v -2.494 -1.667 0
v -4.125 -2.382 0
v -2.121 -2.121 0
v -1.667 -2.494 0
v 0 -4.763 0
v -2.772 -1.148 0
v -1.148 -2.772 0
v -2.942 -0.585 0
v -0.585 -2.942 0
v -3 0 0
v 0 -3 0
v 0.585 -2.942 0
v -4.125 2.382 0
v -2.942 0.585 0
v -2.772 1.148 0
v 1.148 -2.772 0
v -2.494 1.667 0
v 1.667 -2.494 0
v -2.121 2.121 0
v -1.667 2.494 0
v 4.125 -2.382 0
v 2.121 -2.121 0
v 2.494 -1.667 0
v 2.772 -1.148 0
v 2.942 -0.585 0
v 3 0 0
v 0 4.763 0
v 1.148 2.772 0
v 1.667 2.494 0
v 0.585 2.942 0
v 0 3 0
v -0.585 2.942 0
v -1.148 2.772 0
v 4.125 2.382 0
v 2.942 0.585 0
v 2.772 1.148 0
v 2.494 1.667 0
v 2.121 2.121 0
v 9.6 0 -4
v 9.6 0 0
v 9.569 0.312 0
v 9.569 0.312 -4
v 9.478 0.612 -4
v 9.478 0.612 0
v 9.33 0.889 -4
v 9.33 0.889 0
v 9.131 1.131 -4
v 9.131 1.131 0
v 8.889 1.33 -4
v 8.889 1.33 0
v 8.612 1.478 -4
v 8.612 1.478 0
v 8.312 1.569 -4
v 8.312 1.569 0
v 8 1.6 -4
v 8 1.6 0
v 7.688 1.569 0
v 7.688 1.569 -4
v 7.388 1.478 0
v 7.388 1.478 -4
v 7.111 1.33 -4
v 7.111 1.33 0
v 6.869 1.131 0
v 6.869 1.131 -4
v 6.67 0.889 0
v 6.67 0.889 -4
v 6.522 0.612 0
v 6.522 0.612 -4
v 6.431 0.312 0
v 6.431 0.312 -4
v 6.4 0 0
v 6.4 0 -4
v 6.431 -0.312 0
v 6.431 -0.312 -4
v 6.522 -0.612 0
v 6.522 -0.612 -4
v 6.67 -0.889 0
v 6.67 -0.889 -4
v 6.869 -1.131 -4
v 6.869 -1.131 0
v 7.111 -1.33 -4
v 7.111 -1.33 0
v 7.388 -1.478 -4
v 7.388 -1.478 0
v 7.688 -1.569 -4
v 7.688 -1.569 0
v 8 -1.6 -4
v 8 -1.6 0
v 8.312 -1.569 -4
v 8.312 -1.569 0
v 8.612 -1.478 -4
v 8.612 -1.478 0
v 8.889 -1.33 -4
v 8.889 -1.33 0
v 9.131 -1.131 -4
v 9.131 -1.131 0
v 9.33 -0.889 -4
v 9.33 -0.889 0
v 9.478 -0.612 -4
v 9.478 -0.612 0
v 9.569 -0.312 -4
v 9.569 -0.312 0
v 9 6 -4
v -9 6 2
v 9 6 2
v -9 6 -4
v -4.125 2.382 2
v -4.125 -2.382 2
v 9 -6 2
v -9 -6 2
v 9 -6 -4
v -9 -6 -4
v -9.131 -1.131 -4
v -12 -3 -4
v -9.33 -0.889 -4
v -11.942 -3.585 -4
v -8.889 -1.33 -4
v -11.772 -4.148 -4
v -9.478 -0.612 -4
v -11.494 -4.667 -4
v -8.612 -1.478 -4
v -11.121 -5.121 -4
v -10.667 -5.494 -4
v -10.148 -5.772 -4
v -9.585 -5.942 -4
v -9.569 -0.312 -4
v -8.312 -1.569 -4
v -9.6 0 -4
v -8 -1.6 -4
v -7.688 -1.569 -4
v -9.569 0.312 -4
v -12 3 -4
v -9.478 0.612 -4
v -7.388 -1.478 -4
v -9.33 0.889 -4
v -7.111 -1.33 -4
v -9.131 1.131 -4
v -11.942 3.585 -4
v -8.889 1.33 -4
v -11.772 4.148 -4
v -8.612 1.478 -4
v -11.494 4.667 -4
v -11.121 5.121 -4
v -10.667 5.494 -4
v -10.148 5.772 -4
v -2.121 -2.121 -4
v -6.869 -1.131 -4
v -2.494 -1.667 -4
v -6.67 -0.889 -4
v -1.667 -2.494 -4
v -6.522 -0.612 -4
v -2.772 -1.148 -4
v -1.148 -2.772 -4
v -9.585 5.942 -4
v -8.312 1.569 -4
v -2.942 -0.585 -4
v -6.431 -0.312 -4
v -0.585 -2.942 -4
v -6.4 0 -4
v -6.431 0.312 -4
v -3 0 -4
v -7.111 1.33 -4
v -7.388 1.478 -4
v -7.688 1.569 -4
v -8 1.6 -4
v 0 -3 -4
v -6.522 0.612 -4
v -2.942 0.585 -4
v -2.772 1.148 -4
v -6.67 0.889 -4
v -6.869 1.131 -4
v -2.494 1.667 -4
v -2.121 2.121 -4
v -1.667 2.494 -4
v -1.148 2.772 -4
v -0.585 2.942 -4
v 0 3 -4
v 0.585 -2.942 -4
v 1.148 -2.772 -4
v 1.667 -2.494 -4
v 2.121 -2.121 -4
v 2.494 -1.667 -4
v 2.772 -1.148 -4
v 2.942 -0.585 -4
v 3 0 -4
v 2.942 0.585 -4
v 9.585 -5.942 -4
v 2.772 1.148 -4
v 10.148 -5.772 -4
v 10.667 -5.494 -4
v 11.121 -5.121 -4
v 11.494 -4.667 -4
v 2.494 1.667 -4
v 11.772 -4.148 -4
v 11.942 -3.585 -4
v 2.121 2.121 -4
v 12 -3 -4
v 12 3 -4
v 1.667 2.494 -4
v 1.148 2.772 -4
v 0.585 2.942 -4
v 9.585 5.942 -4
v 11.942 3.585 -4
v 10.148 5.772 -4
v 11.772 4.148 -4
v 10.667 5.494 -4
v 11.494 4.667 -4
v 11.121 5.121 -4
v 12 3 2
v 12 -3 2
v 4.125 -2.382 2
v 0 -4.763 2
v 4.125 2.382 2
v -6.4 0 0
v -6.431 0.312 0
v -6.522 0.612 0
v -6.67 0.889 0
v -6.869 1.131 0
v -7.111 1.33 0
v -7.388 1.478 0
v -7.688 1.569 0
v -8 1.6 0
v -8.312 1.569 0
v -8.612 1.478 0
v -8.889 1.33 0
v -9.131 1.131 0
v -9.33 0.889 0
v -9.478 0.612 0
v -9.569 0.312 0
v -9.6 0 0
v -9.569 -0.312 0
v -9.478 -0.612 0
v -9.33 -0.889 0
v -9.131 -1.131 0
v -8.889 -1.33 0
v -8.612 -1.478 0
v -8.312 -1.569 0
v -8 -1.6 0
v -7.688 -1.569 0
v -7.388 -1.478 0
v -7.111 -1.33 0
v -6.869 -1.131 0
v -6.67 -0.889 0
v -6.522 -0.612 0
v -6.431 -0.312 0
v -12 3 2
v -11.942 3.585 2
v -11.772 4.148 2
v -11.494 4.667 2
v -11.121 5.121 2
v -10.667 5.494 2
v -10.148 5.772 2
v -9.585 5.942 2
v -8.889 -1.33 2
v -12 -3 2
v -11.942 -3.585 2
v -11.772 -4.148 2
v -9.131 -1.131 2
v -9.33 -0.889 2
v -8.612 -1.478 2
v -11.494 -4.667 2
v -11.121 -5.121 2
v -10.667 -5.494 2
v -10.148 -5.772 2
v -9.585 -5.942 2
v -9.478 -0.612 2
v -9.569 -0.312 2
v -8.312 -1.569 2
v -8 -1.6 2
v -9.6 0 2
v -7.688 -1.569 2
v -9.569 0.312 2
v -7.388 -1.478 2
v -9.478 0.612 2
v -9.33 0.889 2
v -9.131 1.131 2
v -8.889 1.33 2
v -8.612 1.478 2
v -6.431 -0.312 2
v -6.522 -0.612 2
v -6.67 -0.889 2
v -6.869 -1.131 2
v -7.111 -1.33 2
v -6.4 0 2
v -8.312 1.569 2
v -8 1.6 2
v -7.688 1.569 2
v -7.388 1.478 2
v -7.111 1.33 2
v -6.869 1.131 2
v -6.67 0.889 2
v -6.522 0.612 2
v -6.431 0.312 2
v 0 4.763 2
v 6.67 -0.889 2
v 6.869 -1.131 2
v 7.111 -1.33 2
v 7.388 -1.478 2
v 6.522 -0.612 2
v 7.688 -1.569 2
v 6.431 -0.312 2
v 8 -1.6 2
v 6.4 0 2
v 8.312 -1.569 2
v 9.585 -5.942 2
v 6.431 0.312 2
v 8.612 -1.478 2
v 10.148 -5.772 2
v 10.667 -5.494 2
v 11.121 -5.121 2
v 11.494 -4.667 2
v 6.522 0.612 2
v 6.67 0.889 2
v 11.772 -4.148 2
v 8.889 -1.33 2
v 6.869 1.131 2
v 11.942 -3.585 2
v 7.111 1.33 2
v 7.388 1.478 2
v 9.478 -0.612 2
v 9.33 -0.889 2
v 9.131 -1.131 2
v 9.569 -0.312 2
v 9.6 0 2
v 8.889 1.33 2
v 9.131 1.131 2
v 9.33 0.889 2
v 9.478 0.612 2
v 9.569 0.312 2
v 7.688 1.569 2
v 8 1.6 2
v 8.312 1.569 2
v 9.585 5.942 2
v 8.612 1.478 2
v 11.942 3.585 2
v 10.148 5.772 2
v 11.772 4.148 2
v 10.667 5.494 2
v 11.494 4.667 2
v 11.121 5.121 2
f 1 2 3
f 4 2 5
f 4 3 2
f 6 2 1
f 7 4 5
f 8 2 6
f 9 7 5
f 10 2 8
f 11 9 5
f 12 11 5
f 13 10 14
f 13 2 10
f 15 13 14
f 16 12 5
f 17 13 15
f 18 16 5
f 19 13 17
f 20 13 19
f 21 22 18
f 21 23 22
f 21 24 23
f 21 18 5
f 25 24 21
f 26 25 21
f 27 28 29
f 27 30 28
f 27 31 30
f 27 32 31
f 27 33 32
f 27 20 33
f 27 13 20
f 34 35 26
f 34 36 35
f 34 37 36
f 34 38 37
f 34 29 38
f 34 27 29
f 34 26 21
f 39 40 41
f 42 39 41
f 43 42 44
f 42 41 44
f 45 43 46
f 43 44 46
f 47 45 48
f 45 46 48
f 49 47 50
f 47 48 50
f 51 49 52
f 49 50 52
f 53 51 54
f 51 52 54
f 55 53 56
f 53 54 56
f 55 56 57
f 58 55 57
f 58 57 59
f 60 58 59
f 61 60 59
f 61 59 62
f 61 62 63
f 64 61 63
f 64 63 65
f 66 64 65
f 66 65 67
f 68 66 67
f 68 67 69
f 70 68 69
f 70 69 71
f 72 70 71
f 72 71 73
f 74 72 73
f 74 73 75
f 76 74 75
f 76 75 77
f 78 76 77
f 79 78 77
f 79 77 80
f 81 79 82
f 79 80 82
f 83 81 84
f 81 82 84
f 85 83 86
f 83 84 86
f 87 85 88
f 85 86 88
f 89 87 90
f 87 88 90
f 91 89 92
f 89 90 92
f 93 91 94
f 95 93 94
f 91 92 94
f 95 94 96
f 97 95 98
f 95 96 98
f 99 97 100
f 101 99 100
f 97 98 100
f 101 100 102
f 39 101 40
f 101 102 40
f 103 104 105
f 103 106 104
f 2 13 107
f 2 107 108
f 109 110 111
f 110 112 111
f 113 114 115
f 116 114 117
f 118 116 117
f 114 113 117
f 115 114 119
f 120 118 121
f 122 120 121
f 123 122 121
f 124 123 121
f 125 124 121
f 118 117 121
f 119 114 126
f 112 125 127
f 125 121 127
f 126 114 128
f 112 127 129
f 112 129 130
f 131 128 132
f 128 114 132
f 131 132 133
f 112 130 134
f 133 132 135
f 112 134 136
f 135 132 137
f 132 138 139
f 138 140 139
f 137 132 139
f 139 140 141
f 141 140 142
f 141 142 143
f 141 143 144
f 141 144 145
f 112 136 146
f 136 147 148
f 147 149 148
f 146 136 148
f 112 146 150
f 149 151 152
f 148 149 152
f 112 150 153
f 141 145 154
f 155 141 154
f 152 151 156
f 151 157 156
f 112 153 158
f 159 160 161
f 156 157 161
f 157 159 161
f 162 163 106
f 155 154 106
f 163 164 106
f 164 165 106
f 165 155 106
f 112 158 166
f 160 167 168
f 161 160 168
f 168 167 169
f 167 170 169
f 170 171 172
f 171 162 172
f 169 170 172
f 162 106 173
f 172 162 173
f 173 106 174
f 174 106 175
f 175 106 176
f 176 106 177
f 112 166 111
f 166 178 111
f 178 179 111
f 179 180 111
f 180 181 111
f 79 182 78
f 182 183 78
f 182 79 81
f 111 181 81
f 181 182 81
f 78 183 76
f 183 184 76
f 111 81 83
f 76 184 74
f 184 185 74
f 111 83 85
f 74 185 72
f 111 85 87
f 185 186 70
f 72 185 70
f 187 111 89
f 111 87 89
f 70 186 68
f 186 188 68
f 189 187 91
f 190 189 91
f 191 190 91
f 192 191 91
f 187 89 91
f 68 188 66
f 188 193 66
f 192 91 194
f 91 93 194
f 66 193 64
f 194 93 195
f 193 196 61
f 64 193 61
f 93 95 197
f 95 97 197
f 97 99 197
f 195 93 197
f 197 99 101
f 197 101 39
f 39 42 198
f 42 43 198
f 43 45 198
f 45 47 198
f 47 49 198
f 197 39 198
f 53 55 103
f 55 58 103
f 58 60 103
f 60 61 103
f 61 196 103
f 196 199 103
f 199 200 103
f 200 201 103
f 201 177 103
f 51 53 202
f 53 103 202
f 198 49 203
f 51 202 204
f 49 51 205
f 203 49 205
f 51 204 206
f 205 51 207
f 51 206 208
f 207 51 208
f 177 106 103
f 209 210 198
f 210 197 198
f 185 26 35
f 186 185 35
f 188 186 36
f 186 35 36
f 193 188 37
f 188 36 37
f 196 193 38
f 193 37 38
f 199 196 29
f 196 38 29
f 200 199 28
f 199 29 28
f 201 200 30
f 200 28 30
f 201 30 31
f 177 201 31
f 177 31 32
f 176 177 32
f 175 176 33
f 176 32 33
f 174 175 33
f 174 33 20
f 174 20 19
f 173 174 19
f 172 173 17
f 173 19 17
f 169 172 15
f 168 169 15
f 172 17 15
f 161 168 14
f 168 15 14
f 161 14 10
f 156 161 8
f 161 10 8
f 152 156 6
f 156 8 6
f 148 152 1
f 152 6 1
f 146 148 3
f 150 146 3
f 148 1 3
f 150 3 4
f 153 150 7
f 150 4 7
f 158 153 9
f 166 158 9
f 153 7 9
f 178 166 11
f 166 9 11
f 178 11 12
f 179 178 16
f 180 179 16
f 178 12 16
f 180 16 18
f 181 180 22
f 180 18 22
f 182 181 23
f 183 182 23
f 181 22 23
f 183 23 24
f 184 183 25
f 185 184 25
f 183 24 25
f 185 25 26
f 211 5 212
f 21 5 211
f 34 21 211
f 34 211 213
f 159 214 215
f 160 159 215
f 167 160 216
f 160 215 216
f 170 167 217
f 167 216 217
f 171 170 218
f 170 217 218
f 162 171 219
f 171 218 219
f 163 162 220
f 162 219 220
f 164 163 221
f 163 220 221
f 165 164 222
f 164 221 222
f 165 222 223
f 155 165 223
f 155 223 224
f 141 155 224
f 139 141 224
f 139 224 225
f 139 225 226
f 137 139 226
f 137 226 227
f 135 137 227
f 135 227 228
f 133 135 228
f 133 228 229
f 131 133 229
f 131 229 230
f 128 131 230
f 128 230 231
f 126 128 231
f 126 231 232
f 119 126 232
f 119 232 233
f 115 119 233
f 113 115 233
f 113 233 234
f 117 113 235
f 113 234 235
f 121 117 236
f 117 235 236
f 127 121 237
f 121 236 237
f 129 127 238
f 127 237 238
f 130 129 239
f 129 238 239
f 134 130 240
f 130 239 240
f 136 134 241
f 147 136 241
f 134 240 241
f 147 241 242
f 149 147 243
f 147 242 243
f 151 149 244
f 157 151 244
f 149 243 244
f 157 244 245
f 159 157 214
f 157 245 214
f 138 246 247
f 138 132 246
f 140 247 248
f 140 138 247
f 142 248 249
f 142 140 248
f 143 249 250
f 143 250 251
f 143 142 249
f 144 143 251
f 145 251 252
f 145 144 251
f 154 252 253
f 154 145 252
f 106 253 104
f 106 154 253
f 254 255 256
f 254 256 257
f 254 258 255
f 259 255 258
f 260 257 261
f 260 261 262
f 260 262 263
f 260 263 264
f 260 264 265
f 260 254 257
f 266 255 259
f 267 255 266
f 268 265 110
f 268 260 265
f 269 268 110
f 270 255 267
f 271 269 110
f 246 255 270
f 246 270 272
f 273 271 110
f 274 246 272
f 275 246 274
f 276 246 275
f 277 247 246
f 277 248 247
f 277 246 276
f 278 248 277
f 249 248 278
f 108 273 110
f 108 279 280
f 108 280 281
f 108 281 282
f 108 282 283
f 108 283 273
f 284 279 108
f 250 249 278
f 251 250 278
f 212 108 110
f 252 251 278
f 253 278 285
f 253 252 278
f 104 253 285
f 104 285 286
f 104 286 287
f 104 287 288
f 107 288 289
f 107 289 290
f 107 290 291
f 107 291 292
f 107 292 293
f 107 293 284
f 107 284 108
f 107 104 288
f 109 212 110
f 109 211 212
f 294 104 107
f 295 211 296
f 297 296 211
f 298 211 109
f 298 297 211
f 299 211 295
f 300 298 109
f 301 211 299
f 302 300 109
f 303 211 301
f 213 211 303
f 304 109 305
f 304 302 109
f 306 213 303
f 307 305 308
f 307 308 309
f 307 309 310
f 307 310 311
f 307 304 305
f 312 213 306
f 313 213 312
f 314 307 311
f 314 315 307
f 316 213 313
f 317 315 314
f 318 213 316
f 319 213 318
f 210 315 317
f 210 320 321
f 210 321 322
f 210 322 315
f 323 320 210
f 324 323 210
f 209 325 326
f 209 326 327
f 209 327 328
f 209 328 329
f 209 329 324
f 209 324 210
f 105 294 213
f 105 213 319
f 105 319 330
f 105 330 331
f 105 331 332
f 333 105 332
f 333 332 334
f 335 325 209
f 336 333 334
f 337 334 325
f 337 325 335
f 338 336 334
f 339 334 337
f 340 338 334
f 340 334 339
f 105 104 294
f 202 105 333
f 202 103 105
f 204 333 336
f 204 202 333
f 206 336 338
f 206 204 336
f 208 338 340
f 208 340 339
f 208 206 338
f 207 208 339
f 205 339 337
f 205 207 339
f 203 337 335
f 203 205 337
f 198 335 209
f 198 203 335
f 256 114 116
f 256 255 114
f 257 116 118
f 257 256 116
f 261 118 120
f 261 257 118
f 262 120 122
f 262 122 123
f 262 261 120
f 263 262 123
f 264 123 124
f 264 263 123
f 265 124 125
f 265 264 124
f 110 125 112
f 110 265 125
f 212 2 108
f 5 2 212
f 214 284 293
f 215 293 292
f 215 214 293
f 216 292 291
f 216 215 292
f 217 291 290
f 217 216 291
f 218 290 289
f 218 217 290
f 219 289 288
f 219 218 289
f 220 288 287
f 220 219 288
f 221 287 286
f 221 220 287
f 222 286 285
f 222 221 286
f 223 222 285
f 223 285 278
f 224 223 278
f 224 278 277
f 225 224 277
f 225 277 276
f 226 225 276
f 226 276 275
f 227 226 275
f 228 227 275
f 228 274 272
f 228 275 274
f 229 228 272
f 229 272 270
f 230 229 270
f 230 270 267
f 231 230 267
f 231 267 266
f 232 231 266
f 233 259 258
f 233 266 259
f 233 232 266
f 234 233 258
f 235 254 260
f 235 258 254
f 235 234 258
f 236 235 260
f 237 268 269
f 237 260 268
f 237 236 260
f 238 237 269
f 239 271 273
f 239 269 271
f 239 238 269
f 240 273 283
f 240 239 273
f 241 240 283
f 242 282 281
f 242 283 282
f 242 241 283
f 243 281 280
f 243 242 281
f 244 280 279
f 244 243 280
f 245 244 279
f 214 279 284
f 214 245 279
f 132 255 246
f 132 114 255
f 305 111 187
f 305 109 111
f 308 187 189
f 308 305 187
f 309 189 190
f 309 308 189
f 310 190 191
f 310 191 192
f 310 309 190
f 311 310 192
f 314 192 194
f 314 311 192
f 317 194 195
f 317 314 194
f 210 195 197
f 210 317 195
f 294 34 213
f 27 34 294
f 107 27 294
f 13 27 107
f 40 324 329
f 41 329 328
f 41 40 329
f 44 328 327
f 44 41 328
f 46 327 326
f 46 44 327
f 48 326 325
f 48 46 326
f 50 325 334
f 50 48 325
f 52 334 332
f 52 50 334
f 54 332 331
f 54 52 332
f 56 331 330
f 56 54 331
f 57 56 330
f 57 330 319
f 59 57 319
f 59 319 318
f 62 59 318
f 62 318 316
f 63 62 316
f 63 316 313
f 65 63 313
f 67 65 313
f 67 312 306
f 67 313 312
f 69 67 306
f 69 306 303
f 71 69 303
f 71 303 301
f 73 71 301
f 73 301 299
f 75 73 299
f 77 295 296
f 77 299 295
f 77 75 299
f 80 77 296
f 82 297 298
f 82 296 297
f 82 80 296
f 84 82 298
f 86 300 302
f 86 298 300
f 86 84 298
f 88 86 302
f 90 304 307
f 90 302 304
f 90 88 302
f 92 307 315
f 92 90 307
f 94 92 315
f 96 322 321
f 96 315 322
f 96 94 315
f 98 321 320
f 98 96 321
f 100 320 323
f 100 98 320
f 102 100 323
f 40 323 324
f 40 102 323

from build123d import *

# Parameters (mm, degrees)
SKETCH_W          = 24
SKETCH_H          = 12
SKETCH_R          = 3
PAD_DEPTH         = 4
SKETCH001_W       = 24
SKETCH001_H       = 12
PAD001_DEPTH      = 2
SKETCH002_R       = 1.6
POCKET_DEPTH      = 4.001
POCKET_DEPTH_BACK = -2.001
FILLET_R          = 3


with BuildPart() as part:
    # Sketch → Pad (new body)
    with BuildSketch(Plane.XY):
        Rectangle(SKETCH_W, SKETCH_H)
        Circle(SKETCH_R, mode=Mode.SUBTRACT)
    extrude(amount=-PAD_DEPTH)

    # Sketch001 → Pad001 (join)
    with BuildSketch(Plane.XY):
        Rectangle(SKETCH001_W, SKETCH001_H)
        Polygon((4.125, -2.38157), (4.125, 2.38157), (0, 4.76314), (-4.125, 2.38157), (-4.125, -2.38157), (0, -4.76314), align=None, mode=Mode.SUBTRACT)
    extrude(amount=PAD001_DEPTH)

    # Sketch002 → Pocket (cut, two sides)
    with BuildSketch(Plane.XY) as pocket_sk:
        with Locations((-8, 0)):
            Circle(SKETCH002_R)
        with Locations((8, 0)):
            Circle(SKETCH002_R)
    extrude(amount=-POCKET_DEPTH, mode=Mode.SUBTRACT)
    extrude(pocket_sk.sketch, amount=-POCKET_DEPTH_BACK, mode=Mode.SUBTRACT)

    # Fillet
    fillet_edges = [part.edges().sort_by_distance(p)[0] for p in [
        (-12, -6, -2),
        (-12, 6, -2),
        (12, 6, -2),
        (12, -6, -2),
    ]]
    fillet(fillet_edges, radius=FILLET_R)


solid = part.part
